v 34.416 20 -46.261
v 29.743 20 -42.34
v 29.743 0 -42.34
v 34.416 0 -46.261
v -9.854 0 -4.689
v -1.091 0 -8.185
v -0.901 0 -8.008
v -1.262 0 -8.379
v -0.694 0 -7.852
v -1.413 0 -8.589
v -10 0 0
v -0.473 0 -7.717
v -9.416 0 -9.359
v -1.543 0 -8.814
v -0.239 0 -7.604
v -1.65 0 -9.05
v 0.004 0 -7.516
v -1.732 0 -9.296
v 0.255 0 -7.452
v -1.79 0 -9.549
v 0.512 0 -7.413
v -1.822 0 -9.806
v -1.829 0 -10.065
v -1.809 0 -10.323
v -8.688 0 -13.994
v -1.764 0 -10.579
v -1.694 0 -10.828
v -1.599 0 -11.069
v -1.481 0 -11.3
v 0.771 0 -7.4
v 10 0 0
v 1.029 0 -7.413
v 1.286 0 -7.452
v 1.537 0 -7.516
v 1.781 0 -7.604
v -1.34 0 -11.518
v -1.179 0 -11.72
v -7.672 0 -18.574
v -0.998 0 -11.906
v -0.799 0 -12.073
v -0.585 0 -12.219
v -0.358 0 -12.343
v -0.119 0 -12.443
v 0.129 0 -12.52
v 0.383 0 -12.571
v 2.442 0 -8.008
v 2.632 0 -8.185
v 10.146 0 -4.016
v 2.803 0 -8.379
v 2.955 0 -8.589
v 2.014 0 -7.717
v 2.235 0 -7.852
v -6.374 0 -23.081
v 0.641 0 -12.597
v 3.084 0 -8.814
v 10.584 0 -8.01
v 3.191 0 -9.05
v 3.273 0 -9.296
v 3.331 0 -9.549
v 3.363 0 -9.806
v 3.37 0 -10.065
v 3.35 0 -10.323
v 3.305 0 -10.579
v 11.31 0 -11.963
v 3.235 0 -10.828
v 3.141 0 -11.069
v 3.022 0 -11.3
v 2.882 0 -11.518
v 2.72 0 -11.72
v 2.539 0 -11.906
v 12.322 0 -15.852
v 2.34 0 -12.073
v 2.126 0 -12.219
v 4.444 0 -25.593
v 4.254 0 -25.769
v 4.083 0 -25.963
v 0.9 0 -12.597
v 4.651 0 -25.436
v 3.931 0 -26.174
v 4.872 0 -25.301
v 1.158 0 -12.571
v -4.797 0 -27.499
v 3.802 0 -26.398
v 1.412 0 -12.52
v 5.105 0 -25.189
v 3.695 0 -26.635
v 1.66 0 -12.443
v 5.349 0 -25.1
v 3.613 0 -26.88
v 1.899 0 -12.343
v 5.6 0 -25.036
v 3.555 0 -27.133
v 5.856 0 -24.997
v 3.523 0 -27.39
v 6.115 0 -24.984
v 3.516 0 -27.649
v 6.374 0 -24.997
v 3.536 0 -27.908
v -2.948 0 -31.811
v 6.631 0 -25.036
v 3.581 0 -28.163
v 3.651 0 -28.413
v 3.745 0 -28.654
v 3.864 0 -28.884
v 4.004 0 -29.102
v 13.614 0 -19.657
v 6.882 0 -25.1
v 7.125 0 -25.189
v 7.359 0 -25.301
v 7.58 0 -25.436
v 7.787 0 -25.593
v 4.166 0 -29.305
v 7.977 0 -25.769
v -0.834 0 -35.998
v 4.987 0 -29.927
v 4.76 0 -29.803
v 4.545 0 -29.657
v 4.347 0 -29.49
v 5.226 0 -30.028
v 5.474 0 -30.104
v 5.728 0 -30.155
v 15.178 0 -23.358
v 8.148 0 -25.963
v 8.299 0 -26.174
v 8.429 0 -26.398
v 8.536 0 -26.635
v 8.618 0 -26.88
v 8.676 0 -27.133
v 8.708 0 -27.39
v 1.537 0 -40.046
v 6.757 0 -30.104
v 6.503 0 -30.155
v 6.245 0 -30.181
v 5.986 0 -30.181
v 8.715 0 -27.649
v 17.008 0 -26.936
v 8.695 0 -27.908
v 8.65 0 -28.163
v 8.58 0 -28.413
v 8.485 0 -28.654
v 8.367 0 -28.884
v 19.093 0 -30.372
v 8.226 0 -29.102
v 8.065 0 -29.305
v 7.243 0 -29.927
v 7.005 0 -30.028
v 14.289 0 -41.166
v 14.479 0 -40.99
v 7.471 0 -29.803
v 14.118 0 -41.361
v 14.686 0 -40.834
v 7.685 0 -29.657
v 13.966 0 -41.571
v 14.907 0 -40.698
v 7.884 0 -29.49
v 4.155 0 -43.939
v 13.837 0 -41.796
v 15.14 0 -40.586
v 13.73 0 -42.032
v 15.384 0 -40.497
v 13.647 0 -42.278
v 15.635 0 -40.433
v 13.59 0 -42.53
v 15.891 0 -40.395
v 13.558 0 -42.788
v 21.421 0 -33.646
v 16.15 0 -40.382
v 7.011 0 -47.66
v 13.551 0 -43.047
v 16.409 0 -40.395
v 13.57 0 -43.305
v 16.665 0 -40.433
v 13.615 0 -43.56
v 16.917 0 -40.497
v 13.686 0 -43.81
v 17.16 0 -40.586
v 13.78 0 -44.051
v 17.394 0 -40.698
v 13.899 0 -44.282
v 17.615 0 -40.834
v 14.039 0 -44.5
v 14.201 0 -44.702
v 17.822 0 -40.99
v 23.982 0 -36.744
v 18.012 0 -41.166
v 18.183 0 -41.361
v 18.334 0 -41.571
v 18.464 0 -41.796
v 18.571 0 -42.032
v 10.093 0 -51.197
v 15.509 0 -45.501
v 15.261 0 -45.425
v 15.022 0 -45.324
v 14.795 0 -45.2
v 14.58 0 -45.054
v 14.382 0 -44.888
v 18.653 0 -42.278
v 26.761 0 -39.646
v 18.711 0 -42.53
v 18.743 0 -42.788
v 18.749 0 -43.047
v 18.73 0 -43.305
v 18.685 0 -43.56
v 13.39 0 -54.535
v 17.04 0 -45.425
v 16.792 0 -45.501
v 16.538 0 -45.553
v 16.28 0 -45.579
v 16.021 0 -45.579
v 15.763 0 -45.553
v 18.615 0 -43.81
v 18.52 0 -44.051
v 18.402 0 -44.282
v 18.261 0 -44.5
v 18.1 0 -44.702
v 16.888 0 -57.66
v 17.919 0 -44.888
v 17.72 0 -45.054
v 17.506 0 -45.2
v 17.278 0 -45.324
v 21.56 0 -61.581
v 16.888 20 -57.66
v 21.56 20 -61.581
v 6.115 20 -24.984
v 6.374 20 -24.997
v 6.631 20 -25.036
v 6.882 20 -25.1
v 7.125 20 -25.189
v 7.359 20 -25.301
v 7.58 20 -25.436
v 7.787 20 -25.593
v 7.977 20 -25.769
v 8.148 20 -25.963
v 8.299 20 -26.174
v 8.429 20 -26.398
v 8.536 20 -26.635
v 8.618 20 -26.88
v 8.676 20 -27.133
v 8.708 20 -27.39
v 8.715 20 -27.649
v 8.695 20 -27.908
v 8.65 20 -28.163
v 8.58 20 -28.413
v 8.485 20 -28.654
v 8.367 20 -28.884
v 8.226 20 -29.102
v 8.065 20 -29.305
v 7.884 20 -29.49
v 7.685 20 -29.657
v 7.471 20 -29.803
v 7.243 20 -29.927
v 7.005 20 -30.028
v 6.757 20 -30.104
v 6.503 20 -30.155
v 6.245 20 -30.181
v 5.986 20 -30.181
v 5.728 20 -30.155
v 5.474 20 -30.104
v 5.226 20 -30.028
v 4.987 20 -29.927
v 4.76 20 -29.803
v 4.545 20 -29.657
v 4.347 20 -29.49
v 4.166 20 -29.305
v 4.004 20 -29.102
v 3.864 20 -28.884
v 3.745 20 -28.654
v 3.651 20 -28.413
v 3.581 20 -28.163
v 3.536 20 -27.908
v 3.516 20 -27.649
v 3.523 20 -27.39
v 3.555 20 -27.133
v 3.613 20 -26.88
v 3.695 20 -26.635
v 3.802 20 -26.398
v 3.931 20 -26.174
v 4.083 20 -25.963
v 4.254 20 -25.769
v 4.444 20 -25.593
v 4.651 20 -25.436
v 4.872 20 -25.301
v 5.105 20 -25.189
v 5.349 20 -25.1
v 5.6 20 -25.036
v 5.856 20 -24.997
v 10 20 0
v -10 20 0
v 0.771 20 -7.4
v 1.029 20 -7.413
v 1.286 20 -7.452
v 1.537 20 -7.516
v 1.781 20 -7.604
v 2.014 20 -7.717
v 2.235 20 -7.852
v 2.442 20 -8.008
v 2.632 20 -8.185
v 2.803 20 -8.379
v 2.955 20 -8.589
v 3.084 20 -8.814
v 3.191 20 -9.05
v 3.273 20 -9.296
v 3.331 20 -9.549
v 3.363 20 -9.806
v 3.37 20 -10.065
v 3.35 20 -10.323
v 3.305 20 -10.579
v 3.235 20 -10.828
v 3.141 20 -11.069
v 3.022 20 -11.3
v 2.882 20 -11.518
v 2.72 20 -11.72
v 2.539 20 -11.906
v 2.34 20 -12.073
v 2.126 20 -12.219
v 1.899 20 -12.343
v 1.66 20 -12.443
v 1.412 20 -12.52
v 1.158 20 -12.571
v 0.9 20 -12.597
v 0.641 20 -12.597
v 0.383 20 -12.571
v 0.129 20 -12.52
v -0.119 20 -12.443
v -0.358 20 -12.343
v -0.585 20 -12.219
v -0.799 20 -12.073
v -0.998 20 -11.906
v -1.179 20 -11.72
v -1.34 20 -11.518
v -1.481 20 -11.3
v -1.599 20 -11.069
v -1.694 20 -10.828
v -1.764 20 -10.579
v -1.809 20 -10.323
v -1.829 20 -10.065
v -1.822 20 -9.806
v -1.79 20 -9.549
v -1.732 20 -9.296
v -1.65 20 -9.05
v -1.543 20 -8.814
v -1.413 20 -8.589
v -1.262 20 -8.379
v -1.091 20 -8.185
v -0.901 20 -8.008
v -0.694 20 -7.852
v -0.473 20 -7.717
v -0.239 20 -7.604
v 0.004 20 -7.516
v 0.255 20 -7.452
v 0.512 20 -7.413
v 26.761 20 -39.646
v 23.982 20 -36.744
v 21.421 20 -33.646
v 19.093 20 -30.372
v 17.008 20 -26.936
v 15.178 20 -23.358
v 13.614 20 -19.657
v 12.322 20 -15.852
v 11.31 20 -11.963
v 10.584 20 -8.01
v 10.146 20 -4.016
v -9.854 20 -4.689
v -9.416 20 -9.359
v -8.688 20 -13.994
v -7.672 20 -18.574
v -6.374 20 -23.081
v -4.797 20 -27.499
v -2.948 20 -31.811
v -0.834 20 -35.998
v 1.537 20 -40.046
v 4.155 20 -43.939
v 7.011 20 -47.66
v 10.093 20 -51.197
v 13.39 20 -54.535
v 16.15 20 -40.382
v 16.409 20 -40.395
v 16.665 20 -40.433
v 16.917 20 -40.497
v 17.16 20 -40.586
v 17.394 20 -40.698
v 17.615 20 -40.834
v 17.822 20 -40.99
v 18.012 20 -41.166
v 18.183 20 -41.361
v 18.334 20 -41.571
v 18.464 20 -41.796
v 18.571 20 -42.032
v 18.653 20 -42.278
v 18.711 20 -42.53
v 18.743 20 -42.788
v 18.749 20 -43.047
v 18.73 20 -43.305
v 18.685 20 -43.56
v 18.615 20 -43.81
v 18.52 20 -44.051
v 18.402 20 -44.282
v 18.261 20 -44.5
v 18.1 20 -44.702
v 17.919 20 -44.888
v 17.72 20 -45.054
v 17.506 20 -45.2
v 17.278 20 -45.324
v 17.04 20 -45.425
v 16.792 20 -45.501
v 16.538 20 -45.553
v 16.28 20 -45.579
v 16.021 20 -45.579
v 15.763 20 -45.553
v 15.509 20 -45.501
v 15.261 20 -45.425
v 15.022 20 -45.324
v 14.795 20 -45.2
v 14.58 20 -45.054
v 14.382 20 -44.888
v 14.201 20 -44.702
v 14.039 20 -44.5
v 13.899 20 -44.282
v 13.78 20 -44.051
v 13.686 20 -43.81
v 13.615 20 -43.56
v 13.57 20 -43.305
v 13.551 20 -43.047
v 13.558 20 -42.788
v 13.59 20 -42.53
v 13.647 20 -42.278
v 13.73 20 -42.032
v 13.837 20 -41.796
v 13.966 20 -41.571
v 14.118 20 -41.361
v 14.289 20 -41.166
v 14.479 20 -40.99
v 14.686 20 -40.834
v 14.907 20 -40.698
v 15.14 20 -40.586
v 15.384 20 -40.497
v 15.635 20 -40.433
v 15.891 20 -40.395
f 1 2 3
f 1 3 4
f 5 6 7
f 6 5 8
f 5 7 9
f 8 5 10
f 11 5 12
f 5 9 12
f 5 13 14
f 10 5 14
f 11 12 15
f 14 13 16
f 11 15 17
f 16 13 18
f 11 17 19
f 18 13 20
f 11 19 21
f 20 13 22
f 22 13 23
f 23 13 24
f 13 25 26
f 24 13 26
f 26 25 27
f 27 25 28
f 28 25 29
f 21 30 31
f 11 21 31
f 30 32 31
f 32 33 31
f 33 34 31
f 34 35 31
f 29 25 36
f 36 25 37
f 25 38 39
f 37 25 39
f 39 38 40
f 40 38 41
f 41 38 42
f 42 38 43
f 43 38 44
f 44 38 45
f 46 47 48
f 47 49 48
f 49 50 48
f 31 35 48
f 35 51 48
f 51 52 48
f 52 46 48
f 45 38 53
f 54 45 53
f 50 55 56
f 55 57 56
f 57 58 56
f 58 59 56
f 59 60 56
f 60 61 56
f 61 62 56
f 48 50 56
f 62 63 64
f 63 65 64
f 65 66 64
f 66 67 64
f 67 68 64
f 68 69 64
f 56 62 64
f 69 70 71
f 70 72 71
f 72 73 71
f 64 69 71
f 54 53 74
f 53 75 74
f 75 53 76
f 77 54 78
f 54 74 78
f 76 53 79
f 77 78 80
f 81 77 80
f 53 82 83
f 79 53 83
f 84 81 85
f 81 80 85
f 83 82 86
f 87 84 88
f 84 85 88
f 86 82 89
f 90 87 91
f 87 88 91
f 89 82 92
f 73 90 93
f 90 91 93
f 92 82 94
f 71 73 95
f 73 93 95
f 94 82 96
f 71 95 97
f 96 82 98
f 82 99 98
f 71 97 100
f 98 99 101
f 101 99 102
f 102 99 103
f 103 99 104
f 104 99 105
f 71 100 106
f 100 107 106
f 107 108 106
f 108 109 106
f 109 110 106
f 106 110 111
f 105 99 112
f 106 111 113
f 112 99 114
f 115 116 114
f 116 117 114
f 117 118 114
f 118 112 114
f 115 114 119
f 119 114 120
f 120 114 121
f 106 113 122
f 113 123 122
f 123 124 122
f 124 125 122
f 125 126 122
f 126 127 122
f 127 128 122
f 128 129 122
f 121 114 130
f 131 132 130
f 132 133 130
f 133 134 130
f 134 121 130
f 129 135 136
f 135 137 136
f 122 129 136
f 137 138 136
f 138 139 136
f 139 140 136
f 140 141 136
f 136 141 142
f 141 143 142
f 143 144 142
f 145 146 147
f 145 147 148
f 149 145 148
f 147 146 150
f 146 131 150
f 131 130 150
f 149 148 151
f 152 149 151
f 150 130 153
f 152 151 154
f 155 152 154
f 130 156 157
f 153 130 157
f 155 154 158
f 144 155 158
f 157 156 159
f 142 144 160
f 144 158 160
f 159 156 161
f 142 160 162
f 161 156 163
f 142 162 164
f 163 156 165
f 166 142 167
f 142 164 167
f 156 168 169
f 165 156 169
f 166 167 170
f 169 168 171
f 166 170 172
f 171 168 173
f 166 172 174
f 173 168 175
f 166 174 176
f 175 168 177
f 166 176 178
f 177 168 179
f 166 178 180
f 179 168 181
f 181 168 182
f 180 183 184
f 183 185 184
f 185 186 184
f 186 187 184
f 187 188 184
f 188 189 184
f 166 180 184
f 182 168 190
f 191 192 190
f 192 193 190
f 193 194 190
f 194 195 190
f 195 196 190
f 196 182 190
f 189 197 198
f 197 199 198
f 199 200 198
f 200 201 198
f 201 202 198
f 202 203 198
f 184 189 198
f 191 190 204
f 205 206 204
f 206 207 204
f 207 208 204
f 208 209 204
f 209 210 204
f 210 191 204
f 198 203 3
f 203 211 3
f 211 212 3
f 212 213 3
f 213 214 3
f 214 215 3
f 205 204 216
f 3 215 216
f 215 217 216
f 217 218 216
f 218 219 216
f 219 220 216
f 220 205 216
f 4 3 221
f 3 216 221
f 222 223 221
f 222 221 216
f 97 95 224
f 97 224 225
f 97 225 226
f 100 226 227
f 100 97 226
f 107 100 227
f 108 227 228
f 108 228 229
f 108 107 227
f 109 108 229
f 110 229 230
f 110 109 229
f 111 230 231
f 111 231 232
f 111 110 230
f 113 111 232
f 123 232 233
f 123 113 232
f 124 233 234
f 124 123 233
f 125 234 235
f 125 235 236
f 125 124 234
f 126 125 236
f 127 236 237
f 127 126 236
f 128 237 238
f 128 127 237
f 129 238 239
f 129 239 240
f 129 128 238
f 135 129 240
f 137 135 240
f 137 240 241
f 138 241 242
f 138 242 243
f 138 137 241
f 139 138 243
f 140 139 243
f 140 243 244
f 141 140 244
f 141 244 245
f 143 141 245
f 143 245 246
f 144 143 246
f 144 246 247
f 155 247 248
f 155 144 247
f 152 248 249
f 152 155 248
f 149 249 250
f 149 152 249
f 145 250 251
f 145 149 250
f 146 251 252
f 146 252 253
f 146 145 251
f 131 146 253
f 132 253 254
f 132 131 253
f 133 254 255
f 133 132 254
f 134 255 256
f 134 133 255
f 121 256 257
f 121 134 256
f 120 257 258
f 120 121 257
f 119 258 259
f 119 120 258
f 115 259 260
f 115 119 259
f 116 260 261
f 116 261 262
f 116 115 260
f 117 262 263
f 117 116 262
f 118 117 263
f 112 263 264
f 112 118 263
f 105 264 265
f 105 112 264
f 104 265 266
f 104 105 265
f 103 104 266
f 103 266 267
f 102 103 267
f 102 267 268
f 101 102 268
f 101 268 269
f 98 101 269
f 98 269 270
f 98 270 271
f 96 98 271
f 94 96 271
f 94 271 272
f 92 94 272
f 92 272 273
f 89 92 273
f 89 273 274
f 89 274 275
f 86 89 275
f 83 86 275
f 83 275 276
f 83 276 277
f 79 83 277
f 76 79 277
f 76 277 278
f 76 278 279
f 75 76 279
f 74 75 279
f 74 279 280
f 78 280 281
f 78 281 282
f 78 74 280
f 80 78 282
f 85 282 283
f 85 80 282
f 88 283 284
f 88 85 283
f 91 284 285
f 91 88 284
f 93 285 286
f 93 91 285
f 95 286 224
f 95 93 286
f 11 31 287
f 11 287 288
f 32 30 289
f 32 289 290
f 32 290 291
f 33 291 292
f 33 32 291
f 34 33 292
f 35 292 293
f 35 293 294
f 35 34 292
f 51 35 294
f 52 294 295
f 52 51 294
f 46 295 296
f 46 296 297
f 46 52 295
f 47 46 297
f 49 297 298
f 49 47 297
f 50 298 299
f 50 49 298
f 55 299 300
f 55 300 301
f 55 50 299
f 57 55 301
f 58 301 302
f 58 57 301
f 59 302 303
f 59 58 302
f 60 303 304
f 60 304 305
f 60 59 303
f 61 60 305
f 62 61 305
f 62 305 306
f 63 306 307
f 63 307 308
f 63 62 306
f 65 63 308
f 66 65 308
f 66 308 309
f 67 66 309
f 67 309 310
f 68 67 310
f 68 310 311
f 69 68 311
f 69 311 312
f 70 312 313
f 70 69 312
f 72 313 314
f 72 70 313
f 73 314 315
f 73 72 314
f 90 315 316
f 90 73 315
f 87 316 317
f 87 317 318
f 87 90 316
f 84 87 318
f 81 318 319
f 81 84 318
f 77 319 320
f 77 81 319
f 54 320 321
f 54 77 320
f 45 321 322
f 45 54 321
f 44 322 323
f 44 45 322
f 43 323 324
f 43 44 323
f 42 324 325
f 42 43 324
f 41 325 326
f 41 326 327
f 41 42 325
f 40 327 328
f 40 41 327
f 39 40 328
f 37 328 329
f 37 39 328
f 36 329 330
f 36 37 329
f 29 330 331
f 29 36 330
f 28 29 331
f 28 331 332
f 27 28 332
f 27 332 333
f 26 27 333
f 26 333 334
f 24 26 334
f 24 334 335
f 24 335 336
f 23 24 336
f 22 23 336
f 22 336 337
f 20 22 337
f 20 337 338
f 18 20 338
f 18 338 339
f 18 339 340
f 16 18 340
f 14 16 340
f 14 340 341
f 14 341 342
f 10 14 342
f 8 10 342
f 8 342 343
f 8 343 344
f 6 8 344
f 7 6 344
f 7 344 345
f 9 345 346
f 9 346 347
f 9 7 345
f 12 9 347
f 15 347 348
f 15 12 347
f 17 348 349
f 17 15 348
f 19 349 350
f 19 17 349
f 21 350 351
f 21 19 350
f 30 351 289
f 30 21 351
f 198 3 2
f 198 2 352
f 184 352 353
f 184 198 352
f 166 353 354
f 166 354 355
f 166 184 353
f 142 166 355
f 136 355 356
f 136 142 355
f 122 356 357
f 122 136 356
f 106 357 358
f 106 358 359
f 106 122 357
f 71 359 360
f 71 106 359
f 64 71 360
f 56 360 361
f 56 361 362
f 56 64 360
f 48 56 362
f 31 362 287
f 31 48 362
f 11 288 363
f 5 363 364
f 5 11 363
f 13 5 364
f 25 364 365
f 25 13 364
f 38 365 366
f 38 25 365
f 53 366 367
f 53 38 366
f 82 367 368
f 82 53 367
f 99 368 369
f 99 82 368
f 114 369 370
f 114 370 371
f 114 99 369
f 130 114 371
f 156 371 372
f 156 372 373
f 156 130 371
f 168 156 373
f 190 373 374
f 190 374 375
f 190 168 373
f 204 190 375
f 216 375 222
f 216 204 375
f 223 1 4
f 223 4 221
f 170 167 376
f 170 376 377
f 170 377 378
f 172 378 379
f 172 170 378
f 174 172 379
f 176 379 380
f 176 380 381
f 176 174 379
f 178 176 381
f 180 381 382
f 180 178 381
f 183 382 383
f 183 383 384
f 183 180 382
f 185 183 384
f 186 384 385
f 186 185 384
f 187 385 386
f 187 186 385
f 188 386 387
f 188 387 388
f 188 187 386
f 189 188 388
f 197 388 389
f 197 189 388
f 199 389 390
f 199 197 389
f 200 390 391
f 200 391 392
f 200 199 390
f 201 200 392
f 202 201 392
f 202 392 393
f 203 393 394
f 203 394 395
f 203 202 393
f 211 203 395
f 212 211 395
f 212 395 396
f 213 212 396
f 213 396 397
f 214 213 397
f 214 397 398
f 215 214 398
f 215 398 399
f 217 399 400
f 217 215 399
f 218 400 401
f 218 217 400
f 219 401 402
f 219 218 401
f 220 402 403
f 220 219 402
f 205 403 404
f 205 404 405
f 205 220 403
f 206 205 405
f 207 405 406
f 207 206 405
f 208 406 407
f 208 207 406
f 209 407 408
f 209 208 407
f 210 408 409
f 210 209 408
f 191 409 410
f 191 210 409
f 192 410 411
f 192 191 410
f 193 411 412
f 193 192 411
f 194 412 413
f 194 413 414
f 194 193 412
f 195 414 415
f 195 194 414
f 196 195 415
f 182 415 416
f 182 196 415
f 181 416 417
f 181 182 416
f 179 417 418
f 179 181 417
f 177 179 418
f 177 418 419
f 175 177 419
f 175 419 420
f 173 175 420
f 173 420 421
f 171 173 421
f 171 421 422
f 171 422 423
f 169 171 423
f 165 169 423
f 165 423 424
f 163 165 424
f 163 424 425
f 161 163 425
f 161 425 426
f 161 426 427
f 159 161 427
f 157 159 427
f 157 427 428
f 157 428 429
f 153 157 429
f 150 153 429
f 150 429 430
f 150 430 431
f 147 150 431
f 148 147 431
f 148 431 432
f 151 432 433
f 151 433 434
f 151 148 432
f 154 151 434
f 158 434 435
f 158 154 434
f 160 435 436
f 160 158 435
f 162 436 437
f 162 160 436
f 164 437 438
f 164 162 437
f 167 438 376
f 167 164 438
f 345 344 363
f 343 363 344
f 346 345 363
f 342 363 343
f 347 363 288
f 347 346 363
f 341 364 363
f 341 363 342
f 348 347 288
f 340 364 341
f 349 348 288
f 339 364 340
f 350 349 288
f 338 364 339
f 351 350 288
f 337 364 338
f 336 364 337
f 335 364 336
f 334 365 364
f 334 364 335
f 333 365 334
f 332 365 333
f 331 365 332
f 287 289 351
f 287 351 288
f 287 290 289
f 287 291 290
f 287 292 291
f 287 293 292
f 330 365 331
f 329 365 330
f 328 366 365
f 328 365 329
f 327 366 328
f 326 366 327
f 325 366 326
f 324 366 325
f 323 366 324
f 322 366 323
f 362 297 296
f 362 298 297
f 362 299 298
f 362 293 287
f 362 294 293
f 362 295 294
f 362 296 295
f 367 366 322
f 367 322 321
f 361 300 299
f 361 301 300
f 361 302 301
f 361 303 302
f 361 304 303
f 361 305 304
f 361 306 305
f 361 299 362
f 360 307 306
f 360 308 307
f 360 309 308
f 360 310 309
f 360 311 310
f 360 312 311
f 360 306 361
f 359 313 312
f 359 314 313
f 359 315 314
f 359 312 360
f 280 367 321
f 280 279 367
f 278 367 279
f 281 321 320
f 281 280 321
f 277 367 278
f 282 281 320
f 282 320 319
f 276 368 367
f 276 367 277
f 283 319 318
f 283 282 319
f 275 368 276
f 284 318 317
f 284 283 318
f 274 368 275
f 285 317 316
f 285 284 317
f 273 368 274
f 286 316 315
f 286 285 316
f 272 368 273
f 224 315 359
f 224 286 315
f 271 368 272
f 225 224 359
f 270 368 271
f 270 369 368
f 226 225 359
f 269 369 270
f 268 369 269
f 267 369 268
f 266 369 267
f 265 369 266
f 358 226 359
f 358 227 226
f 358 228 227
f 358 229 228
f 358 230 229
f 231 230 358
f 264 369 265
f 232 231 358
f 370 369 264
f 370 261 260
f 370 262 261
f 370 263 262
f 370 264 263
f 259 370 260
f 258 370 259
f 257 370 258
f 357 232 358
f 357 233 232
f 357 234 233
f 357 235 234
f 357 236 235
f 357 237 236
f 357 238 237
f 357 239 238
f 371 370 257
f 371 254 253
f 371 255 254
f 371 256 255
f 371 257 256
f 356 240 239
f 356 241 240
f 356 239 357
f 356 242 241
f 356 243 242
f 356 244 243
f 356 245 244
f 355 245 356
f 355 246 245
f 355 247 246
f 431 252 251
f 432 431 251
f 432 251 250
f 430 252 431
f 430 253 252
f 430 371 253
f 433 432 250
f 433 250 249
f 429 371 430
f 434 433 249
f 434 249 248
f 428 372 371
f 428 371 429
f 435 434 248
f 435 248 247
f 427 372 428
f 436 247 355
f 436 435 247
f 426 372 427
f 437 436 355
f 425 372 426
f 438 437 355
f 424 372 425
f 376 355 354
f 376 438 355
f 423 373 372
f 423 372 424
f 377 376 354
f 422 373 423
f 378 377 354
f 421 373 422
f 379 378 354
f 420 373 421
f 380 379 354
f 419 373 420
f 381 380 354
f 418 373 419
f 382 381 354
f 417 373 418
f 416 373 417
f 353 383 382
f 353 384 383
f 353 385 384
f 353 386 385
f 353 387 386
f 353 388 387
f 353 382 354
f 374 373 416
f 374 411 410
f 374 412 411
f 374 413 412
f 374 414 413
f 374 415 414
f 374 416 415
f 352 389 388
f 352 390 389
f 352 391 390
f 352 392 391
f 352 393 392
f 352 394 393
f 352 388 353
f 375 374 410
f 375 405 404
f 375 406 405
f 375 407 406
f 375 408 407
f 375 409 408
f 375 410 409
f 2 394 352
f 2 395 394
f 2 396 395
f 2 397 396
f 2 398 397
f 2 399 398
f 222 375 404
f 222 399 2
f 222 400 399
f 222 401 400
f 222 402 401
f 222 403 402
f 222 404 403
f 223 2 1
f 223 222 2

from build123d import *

# Parameters (mm, degrees)
SKETCH1_R           = 2.6
BOSS_EXTRUDE1_DEPTH = 20
BOSS_EXTRUDE2_DEPTH = 20


with BuildPart() as part:
    # Sketch1 → Boss-Extrude1 (new body)
    with BuildSketch(Plane(origin=(0, 0, 0), x_dir=(1, 0, 0), z_dir=(0, 1, 0))):
        with BuildLine():
            Line((10, 0), (-10, 0))
            ThreePointArc((-10, 0), (-2.947752983, 31.810630591), (16.887506811, 57.660444431))
            Line((16.887506811, 57.660444431), (29.743259005, 42.339555569))
            ThreePointArc((29.743259005, 42.339555569), (15.178402758, 23.358265357), (10, 0))
        make_face()
        with Locations(Location((0.770593323, 10, 0), (0, 0, 270))):
            Circle(SKETCH1_R, mode=Mode.SUBTRACT)
        with Locations(Location((6.115324888, 27.584447974, 0), (0, 0, 270))):
            Circle(SKETCH1_R, mode=Mode.SUBTRACT)
        with Locations(Location((16.150266317, 42.98181517, 0), (0, 0, 270))):
            Circle(SKETCH1_R, mode=Mode.SUBTRACT)
    extrude(amount=BOSS_EXTRUDE1_DEPTH)

    # Sketch2 → Boss-Extrude2 (add)
    with BuildSketch(Plane(origin=(0, 20, 0), x_dir=(1, 0, 0), z_dir=(0, 1, 0))):
        Polygon((16.887506811, 57.660444431), (29.743259005, 42.339555569), (34.416130108, 46.260559988), (21.560377914, 61.58144885), align=None)
    extrude(amount=-BOSS_EXTRUDE2_DEPTH)


solid = part.part
